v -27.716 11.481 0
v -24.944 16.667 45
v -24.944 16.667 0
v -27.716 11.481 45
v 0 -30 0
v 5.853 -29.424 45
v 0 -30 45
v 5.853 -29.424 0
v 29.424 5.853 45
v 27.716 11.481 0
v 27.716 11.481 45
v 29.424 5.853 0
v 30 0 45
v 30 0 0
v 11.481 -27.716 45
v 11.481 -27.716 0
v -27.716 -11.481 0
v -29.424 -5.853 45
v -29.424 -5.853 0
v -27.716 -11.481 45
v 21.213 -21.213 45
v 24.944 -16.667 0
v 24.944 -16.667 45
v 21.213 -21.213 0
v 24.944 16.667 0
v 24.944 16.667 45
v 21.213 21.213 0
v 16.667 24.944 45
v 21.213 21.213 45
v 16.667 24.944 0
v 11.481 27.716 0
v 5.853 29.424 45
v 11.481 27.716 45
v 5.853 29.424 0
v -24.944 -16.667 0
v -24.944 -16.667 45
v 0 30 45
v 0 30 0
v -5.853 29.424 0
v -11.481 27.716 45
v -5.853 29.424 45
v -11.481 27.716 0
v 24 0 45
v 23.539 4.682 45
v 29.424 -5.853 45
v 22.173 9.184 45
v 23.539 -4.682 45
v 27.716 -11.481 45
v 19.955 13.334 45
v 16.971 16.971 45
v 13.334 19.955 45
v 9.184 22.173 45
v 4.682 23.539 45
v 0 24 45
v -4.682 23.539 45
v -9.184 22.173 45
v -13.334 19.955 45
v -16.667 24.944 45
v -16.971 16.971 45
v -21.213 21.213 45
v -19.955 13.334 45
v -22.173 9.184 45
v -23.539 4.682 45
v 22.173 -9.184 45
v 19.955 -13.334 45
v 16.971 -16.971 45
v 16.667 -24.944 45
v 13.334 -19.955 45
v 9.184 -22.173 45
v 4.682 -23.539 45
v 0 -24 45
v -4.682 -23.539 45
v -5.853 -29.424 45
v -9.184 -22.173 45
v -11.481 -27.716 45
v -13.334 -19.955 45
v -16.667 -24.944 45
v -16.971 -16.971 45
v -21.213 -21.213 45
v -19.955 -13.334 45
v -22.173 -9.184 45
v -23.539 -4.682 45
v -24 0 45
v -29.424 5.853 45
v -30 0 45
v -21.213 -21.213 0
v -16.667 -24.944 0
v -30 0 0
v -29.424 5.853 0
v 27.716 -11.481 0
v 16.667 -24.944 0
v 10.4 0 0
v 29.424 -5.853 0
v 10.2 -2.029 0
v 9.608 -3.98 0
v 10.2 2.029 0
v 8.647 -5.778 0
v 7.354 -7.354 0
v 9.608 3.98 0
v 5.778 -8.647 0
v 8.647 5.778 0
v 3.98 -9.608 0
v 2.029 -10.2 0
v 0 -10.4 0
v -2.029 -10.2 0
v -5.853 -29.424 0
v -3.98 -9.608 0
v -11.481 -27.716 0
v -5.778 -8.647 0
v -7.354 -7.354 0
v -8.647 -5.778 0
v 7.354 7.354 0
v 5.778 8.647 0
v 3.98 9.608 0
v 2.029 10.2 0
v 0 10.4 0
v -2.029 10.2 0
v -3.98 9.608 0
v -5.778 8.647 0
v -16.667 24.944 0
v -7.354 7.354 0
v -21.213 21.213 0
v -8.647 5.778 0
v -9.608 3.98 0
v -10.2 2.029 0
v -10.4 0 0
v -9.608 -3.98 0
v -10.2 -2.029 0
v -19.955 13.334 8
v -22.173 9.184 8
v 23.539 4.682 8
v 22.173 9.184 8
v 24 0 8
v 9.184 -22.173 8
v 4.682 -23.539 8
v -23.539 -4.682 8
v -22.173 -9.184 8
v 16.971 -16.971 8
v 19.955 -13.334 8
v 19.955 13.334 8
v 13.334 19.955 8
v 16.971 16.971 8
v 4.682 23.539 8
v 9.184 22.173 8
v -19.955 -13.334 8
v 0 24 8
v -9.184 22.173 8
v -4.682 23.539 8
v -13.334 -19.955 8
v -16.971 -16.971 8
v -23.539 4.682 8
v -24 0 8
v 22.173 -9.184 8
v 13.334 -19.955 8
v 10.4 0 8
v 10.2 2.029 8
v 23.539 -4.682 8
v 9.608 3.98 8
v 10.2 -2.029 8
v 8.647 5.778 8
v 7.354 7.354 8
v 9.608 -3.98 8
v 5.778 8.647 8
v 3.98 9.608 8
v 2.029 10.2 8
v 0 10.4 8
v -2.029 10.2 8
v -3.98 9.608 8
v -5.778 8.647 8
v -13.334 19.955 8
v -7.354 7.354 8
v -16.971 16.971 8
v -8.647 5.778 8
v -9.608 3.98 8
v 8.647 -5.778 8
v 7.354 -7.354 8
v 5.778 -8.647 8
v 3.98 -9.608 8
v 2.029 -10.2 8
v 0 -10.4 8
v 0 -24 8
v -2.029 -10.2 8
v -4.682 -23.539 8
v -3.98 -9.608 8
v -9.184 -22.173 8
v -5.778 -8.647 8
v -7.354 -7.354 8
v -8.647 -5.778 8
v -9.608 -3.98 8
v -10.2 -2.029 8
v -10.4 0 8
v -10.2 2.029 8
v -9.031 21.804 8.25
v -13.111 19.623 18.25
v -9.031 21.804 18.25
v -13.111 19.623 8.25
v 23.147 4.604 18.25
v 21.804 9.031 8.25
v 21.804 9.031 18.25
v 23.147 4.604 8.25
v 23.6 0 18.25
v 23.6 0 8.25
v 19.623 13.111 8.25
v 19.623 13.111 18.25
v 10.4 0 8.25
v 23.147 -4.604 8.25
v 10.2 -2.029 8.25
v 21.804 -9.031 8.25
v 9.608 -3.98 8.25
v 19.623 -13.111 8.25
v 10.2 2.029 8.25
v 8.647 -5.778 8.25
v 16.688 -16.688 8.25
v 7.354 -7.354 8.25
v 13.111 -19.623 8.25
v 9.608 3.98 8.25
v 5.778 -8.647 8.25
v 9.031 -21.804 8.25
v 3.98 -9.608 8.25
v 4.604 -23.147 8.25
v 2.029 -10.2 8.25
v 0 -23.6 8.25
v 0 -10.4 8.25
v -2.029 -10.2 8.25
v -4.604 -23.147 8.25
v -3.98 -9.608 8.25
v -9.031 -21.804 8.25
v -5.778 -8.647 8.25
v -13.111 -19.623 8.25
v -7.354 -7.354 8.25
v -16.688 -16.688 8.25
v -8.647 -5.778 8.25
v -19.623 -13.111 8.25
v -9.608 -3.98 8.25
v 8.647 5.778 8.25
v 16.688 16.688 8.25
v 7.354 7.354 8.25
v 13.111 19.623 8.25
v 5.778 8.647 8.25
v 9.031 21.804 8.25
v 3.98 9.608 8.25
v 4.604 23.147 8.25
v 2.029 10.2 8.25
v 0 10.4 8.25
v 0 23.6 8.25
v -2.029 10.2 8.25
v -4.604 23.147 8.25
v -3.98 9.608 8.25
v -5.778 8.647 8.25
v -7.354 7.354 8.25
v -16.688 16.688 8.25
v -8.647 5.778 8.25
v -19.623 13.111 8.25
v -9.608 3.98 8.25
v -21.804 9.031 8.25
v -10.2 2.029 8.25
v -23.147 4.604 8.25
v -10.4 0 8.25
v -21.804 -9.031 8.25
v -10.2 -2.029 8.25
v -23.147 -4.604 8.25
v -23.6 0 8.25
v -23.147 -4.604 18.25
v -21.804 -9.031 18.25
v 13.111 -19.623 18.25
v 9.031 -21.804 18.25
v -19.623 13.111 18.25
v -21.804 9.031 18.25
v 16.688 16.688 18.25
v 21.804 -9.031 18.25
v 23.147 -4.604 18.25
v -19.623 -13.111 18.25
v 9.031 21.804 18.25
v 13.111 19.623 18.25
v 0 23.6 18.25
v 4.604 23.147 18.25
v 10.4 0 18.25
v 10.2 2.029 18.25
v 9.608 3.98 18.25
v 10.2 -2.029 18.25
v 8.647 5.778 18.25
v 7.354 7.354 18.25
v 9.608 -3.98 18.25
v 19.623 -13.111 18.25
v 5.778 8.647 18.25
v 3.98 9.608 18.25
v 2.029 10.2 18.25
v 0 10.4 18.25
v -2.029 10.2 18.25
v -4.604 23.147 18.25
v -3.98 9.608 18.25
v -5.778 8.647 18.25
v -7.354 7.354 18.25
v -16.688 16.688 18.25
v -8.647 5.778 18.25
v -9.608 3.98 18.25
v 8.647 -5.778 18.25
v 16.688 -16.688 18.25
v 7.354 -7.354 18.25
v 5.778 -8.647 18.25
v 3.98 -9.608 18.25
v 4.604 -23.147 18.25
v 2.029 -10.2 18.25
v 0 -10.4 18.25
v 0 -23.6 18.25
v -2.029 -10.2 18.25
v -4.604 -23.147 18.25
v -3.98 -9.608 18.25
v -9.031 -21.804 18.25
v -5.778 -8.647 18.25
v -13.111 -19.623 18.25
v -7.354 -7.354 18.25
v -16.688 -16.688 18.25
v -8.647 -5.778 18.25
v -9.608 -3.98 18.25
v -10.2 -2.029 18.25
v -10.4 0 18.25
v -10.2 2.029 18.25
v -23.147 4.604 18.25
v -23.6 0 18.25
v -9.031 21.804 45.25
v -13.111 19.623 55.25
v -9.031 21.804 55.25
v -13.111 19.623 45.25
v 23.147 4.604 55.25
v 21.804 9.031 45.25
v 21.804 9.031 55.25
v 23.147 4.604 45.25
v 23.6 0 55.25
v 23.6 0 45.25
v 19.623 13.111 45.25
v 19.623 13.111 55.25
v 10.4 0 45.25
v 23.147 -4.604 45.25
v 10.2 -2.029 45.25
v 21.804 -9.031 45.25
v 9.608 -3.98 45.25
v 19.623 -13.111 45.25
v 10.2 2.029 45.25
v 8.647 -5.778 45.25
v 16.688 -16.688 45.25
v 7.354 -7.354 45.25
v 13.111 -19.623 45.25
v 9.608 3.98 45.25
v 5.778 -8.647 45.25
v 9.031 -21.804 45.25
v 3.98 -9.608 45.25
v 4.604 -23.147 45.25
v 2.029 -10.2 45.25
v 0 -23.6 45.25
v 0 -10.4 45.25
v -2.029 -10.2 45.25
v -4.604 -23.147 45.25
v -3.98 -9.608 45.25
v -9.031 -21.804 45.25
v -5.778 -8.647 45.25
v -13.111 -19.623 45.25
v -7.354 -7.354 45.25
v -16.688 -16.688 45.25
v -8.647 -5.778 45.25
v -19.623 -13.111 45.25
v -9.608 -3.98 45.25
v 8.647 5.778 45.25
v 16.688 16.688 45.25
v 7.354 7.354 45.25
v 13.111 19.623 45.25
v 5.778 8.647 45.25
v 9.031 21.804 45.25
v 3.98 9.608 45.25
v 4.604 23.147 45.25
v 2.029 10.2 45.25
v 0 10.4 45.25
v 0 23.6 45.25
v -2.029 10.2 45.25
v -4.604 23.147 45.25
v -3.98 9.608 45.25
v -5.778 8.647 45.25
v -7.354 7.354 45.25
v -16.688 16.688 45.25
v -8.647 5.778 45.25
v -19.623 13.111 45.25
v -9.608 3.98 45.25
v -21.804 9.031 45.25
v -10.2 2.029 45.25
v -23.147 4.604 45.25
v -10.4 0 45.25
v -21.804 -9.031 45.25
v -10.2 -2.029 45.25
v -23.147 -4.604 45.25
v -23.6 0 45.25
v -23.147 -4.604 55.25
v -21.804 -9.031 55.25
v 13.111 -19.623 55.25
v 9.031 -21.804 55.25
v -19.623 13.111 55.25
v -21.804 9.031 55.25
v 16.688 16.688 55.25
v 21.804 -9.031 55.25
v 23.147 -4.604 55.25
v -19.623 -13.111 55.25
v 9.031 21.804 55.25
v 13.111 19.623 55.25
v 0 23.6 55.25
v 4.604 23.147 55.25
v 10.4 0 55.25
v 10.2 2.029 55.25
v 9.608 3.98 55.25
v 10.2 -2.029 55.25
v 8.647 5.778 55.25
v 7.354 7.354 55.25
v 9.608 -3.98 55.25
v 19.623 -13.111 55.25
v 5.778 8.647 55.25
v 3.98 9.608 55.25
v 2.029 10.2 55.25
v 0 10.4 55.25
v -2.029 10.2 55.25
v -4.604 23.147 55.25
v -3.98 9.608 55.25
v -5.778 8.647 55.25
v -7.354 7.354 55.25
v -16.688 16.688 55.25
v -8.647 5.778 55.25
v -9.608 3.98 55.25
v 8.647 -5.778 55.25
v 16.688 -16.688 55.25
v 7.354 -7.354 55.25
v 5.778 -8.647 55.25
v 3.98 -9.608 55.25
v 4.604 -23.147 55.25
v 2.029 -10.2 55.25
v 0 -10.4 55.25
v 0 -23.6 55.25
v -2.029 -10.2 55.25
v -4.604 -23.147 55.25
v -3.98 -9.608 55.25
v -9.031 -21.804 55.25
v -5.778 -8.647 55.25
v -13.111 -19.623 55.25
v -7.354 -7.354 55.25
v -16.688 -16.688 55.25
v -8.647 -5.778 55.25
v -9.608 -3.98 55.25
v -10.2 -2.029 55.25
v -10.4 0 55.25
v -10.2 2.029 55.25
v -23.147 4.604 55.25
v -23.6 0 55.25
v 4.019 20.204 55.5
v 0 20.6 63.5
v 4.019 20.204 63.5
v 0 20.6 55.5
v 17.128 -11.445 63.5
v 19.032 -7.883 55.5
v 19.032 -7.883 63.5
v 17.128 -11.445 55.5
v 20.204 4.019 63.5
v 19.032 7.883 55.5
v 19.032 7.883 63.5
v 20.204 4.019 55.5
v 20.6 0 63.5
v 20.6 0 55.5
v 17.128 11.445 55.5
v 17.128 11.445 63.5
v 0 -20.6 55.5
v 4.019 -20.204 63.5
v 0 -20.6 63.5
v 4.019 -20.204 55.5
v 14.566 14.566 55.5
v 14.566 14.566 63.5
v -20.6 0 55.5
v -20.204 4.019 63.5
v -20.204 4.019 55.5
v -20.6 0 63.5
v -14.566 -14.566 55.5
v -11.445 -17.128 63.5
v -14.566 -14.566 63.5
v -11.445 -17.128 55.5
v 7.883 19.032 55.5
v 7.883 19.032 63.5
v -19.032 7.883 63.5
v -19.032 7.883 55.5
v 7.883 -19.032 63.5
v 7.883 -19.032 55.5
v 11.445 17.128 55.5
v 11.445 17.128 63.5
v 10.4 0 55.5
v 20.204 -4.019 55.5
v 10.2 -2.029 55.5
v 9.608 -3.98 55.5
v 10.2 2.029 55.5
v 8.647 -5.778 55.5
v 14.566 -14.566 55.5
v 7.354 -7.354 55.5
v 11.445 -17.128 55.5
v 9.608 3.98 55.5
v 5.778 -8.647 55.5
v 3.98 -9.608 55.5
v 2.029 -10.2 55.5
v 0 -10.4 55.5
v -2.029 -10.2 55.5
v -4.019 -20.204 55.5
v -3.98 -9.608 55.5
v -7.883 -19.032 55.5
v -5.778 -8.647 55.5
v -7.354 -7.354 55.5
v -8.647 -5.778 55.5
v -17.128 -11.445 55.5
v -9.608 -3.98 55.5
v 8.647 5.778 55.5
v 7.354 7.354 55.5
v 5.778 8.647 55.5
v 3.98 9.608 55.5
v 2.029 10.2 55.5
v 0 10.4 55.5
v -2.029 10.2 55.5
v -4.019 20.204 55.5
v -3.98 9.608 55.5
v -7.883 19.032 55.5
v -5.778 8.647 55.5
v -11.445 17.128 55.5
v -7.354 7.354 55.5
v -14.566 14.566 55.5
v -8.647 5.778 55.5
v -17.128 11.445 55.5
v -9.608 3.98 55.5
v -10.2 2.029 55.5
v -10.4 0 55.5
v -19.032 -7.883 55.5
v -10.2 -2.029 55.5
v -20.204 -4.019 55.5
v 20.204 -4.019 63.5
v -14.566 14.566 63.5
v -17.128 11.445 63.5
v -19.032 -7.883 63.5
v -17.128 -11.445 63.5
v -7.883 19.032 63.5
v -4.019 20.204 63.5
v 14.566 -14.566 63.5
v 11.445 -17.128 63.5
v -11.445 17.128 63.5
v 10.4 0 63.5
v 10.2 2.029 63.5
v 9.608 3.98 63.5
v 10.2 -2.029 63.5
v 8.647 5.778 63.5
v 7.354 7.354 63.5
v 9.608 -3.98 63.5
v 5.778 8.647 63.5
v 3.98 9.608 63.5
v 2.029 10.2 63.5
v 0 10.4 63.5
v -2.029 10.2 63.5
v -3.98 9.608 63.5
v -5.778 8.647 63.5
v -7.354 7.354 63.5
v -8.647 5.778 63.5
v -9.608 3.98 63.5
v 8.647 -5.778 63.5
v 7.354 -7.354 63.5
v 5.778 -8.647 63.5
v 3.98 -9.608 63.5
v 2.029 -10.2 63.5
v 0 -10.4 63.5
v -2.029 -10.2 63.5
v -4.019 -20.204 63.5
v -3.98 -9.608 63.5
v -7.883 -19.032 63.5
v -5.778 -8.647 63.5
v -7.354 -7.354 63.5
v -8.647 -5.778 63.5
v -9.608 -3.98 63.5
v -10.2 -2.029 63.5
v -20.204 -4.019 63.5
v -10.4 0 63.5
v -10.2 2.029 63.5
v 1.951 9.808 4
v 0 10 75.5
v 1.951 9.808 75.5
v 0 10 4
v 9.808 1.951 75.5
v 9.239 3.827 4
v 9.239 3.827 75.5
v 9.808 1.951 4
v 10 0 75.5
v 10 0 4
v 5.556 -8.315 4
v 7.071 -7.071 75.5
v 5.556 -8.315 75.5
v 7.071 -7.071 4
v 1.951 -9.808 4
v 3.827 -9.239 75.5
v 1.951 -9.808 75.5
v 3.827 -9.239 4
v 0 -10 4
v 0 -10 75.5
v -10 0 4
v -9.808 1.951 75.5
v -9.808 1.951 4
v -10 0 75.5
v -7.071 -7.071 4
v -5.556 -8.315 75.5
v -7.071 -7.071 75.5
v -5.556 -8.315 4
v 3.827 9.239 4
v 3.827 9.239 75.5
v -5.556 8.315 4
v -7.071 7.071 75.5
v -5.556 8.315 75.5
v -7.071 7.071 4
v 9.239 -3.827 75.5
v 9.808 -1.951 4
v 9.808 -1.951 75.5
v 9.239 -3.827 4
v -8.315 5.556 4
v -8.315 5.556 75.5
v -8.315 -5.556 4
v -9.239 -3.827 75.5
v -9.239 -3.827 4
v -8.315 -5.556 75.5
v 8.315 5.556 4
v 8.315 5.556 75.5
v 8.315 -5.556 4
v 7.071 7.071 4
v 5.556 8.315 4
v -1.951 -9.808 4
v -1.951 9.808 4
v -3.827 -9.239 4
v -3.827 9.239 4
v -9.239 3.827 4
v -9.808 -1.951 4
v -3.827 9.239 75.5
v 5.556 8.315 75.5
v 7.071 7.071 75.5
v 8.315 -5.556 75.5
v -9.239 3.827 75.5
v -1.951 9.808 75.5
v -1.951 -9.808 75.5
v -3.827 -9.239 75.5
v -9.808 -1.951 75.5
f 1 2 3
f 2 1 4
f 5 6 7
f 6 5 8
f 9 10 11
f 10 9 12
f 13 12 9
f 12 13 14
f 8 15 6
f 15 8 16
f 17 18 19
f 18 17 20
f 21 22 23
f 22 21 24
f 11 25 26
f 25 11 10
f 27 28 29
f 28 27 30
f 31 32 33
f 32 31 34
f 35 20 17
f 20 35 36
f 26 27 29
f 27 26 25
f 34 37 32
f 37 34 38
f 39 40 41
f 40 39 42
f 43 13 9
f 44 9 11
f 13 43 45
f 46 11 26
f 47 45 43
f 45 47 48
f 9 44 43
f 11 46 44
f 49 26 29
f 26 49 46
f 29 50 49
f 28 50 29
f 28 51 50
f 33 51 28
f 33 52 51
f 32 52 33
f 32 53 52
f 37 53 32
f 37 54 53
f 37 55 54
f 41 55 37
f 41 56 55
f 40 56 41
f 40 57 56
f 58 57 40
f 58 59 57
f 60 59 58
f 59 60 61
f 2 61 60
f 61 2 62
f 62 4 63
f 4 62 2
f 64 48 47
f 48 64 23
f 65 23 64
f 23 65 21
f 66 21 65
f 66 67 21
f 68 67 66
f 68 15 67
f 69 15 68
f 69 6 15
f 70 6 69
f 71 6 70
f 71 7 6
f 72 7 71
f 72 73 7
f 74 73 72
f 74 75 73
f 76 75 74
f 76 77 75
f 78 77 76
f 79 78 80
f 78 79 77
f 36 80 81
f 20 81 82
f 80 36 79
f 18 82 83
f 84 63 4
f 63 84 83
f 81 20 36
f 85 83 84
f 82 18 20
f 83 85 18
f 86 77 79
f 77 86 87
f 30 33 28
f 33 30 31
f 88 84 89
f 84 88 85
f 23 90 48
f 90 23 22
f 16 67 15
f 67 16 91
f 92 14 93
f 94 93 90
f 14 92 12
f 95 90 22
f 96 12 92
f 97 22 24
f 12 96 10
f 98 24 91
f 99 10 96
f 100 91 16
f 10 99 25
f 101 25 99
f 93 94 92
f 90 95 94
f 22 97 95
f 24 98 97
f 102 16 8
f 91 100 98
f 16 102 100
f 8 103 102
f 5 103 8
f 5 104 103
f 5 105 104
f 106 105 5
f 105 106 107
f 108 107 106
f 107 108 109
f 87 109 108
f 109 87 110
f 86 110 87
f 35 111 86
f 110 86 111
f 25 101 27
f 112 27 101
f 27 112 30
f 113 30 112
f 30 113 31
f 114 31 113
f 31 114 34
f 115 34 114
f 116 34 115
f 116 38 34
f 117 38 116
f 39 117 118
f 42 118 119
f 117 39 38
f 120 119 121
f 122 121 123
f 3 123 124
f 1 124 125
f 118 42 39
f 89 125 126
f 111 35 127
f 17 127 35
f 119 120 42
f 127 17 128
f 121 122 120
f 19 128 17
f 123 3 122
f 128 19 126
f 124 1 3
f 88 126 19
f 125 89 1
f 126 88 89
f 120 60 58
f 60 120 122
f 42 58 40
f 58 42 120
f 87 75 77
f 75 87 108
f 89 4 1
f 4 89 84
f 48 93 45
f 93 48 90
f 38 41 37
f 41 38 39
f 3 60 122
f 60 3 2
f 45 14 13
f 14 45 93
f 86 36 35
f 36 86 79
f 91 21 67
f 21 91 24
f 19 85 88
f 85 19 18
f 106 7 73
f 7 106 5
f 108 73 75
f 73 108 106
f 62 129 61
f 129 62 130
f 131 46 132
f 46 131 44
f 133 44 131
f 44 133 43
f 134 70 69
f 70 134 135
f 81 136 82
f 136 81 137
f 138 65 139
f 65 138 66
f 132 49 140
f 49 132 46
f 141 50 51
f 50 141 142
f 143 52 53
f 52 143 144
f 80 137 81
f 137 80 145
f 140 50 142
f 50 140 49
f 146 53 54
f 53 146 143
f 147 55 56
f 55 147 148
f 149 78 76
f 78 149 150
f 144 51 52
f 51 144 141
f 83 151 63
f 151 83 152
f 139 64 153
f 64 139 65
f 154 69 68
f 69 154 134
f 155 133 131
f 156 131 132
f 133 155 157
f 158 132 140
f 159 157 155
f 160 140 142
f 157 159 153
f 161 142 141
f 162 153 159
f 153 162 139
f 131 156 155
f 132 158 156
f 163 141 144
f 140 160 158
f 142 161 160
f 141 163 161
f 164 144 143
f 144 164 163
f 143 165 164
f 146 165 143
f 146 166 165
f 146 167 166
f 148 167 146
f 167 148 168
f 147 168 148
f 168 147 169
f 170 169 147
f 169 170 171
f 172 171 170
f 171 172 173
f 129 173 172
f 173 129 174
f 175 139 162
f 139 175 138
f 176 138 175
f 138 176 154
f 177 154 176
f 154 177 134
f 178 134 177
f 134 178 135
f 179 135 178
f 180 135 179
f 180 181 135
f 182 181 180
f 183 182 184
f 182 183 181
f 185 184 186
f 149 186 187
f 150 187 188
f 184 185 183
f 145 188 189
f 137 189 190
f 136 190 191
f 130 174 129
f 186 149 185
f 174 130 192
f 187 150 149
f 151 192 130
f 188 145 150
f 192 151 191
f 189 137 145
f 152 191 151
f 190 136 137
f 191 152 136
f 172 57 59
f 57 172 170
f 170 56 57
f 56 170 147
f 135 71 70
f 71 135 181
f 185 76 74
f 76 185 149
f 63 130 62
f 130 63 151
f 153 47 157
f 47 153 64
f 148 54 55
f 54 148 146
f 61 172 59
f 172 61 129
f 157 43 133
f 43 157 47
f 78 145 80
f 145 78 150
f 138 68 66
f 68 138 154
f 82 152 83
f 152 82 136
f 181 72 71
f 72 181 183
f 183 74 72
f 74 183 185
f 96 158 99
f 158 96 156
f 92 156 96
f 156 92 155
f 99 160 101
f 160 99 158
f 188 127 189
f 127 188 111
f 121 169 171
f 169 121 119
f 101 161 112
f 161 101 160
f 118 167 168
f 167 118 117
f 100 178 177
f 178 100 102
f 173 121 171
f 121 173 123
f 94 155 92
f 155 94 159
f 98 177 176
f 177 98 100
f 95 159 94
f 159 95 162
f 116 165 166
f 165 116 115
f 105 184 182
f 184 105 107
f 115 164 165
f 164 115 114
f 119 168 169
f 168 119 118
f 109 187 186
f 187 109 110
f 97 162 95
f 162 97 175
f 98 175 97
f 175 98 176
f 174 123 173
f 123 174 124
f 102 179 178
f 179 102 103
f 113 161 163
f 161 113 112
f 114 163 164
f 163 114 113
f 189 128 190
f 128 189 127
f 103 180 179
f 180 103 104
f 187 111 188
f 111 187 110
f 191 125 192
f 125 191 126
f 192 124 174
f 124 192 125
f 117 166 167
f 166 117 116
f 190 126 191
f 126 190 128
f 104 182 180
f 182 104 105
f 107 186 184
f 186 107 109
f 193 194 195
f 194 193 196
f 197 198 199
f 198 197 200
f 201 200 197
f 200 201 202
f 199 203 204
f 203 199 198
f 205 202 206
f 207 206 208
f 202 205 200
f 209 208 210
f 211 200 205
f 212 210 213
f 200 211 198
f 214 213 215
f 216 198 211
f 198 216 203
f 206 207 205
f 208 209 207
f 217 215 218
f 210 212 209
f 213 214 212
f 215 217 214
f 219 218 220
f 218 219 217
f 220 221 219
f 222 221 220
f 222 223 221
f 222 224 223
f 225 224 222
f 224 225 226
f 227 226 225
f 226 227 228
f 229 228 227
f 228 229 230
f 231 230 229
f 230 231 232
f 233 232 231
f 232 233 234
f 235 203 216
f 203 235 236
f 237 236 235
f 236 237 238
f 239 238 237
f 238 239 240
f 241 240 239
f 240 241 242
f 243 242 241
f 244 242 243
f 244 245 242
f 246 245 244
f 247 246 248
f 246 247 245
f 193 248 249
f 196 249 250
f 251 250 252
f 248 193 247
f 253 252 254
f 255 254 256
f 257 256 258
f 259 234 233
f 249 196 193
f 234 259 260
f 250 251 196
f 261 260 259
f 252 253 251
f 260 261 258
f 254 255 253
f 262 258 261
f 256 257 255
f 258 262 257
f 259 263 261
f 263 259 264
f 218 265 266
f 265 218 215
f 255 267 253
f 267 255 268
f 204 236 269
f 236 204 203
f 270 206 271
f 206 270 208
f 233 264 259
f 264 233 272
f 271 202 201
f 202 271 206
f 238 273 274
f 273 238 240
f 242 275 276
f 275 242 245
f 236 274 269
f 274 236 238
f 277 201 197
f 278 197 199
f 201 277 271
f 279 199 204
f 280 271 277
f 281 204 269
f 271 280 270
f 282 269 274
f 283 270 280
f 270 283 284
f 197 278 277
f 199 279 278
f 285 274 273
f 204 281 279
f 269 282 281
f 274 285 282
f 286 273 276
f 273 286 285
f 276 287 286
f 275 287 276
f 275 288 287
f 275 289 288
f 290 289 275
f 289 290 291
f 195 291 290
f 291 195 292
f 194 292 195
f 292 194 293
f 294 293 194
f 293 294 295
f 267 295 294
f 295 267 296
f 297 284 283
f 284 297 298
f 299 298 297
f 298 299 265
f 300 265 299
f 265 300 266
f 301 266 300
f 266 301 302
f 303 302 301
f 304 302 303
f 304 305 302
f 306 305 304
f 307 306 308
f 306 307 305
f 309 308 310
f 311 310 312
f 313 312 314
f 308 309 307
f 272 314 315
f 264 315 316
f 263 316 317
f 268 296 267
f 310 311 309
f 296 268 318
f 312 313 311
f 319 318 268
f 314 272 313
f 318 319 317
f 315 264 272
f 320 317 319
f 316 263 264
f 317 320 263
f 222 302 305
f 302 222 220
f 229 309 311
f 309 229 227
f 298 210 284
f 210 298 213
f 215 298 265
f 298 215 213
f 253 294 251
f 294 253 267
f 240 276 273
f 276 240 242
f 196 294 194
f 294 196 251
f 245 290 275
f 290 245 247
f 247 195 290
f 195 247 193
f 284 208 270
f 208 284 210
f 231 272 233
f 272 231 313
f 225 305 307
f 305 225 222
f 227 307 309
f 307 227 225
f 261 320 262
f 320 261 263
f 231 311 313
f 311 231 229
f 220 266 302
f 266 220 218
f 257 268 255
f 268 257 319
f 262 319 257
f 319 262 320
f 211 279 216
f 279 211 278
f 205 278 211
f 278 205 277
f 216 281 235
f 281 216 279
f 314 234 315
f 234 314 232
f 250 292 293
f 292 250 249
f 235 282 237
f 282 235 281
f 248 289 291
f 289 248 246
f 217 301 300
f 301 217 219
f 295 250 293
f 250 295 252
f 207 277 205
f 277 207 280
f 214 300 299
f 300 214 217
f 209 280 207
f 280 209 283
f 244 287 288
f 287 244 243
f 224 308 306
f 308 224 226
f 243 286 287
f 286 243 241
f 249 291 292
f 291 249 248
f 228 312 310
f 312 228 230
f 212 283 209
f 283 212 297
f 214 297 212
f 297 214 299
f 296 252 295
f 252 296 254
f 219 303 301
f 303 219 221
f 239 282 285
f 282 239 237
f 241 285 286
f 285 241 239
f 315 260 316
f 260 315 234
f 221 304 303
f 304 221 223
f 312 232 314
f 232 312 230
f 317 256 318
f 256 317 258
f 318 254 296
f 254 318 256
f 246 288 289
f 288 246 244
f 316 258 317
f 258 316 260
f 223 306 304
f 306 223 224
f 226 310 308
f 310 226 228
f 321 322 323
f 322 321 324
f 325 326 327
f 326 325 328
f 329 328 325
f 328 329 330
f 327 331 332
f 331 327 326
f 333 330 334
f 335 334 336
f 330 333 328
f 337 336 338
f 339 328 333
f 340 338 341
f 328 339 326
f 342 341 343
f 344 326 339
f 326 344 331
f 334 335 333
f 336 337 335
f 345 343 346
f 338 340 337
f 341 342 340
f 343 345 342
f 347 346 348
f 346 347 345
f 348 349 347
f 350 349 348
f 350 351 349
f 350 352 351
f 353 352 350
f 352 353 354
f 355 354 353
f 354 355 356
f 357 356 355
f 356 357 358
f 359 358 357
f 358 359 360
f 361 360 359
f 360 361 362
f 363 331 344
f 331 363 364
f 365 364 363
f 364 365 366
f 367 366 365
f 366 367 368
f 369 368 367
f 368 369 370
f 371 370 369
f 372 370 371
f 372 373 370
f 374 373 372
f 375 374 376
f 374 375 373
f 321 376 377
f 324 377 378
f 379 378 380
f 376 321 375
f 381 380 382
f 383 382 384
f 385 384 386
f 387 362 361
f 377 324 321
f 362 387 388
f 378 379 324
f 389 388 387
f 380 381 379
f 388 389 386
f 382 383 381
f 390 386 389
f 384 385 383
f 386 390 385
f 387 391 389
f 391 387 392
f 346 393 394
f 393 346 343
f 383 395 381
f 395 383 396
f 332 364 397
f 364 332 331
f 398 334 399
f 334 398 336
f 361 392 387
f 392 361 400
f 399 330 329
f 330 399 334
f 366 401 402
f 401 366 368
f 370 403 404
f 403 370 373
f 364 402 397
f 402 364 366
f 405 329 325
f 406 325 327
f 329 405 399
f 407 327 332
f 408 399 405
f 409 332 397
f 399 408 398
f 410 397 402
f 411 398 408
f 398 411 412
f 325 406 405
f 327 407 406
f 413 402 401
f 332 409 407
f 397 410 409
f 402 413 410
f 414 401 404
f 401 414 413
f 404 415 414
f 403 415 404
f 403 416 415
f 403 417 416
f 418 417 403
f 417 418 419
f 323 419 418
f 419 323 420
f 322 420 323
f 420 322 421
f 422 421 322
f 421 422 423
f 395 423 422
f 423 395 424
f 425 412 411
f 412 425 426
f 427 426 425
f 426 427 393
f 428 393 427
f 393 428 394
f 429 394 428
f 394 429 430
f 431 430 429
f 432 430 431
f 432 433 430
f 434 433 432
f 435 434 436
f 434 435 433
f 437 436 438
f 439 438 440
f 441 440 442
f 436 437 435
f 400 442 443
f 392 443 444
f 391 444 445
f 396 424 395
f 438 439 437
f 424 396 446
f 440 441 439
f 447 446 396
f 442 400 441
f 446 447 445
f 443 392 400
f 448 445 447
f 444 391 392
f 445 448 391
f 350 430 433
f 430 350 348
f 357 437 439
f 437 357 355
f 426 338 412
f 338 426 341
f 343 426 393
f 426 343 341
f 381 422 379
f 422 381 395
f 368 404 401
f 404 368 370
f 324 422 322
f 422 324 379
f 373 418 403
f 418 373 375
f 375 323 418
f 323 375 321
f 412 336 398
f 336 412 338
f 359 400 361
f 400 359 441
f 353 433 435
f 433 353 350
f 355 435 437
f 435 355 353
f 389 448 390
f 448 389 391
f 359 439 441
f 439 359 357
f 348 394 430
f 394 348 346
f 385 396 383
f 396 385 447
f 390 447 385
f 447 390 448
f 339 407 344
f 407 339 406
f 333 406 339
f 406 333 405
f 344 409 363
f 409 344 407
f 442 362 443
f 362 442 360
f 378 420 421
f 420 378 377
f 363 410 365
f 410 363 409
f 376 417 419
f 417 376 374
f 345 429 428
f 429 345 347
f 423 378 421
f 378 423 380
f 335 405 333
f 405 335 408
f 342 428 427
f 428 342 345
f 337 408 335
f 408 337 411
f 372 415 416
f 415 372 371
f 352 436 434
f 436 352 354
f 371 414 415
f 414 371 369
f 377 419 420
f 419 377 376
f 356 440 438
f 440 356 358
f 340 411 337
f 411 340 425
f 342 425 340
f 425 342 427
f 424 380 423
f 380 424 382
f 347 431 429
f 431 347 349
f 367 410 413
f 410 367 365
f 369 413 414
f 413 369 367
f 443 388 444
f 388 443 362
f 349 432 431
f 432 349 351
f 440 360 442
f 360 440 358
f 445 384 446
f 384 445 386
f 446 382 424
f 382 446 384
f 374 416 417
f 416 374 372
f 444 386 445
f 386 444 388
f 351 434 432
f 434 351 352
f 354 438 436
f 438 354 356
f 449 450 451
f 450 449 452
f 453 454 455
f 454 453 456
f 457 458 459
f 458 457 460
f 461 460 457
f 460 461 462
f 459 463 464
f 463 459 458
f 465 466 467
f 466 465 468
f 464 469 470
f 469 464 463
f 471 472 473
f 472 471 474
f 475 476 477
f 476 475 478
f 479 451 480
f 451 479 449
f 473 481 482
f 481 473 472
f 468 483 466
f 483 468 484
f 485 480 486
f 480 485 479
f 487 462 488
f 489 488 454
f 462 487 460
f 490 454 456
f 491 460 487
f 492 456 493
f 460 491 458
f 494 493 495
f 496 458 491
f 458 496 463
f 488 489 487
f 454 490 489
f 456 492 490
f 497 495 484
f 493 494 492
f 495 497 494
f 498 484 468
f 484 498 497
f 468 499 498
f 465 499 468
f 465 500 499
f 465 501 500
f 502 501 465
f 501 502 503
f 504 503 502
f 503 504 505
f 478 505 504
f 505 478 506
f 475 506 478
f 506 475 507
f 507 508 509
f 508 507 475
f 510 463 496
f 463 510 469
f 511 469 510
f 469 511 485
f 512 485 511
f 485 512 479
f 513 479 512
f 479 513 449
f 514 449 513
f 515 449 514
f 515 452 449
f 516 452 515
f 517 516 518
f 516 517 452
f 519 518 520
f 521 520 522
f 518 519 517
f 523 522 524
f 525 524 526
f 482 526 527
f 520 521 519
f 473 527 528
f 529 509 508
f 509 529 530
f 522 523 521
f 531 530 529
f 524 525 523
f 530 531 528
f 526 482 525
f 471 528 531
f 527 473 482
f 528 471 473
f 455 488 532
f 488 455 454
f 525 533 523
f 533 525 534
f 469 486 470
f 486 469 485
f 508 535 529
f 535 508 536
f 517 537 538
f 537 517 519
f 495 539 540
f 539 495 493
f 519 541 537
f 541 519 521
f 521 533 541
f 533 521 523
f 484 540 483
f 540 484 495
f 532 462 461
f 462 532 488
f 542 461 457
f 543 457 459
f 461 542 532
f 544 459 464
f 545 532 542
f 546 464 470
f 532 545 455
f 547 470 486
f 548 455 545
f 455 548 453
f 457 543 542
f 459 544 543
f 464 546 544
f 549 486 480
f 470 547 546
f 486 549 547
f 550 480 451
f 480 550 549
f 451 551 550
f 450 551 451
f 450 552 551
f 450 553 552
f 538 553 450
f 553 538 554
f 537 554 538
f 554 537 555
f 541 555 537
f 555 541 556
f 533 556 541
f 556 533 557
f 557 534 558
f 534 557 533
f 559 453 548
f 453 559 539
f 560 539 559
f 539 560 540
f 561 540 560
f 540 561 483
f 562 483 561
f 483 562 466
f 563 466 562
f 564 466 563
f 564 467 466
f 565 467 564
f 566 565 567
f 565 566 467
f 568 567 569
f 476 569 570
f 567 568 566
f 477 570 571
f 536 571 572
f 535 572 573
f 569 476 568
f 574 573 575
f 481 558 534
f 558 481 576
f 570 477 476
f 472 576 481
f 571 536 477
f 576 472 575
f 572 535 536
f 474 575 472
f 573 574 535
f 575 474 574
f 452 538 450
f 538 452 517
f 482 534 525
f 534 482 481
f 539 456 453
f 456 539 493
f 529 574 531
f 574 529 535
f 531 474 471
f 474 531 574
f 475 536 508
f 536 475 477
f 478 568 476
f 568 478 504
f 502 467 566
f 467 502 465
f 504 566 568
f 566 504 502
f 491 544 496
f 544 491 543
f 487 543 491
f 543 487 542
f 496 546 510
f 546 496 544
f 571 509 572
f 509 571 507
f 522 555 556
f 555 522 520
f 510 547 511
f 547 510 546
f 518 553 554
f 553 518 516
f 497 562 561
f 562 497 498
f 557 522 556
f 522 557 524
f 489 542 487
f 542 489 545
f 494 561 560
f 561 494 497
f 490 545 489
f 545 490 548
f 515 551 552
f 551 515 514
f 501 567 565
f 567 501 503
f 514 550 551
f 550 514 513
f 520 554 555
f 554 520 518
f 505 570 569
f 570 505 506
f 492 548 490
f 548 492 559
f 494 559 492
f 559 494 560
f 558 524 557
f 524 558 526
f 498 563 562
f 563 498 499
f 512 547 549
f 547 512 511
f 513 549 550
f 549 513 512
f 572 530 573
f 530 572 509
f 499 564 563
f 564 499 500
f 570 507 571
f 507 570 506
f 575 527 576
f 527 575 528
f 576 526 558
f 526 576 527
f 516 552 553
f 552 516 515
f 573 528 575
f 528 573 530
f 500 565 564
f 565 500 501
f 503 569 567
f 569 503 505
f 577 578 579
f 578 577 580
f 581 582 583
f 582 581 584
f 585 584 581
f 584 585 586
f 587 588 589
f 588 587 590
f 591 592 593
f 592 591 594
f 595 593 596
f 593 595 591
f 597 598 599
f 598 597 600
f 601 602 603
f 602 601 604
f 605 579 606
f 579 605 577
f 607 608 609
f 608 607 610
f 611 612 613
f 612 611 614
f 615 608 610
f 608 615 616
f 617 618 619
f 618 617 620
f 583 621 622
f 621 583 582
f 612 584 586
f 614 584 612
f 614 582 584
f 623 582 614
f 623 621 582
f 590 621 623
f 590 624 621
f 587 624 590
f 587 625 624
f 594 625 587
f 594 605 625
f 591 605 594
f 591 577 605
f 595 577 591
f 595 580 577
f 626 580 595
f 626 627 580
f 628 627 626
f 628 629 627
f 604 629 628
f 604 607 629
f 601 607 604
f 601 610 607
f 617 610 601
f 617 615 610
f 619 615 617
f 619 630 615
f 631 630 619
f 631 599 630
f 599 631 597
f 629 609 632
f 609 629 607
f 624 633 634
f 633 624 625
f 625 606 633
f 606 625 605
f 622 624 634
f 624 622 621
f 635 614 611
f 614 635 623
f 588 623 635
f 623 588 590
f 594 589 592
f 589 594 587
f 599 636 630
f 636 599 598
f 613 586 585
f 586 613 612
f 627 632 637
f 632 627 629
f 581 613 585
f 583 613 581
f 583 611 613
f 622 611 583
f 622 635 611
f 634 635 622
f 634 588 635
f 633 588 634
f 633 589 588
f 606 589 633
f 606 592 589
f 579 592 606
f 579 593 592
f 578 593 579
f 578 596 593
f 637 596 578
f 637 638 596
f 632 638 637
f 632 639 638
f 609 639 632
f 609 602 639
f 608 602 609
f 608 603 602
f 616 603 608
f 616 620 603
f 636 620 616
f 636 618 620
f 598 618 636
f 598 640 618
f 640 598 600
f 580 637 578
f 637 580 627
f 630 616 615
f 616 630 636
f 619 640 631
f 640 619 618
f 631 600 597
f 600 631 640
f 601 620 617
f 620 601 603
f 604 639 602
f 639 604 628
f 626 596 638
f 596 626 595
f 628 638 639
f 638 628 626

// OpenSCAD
$fn = 32;

// ------------------------------------------------------------------------
// Bearing housing: housing d60, two bearings and a shaft
// Every part is its own module, assembly() places them once.
// ------------------------------------------------------------------------

// --- part 1 ---
module housing() {
  difference() {
    cylinder(h = 45, d = 60);
    translate([0, 0, 8]) cylinder(h = 38, d = 48);
    translate([0, 0, -1]) cylinder(h = 10, d = 20.8);
  }
}

// --- part 2 ---
module bearing_lower() {
  difference() {
      translate([0, 0, 0]) cylinder(h = 10, d = 47.2);
      translate([0, 0, -1]) cylinder(h = 12, d = 20.8);
    }
}

// --- part 3 ---
module bearing_upper() {
  difference() {
      translate([0, 0, 0]) cylinder(h = 10, d = 47.2);
      translate([0, 0, -1]) cylinder(h = 12, d = 20.8);
    }
}

// --- part 4 ---
module spacer() {
  difference() {
      translate([0, 0, 0]) cylinder(h = 8, d = 41.2);
      translate([0, 0, -1]) cylinder(h = 10, d = 20.8);
    }
}

// --- part 5 ---
module shaft() {
  translate([0, 0, -35.75]) cylinder(h = 71.5, d = 20);
}

// --- assembly ---
module assembly() {
  translate([0, 0, 0]) rotate([0, 0, 0]) housing();
  translate([0, 0, 8.25]) rotate([0, 0, 0]) bearing_lower();
  translate([0, 0, 45.25]) rotate([0, 0, 0]) bearing_upper();
  translate([0, 0, 55.5]) rotate([0, 0, 0]) spacer();
  translate([0, 0, 39.75]) rotate([0, 0, 0]) shaft();
}

assembly();
